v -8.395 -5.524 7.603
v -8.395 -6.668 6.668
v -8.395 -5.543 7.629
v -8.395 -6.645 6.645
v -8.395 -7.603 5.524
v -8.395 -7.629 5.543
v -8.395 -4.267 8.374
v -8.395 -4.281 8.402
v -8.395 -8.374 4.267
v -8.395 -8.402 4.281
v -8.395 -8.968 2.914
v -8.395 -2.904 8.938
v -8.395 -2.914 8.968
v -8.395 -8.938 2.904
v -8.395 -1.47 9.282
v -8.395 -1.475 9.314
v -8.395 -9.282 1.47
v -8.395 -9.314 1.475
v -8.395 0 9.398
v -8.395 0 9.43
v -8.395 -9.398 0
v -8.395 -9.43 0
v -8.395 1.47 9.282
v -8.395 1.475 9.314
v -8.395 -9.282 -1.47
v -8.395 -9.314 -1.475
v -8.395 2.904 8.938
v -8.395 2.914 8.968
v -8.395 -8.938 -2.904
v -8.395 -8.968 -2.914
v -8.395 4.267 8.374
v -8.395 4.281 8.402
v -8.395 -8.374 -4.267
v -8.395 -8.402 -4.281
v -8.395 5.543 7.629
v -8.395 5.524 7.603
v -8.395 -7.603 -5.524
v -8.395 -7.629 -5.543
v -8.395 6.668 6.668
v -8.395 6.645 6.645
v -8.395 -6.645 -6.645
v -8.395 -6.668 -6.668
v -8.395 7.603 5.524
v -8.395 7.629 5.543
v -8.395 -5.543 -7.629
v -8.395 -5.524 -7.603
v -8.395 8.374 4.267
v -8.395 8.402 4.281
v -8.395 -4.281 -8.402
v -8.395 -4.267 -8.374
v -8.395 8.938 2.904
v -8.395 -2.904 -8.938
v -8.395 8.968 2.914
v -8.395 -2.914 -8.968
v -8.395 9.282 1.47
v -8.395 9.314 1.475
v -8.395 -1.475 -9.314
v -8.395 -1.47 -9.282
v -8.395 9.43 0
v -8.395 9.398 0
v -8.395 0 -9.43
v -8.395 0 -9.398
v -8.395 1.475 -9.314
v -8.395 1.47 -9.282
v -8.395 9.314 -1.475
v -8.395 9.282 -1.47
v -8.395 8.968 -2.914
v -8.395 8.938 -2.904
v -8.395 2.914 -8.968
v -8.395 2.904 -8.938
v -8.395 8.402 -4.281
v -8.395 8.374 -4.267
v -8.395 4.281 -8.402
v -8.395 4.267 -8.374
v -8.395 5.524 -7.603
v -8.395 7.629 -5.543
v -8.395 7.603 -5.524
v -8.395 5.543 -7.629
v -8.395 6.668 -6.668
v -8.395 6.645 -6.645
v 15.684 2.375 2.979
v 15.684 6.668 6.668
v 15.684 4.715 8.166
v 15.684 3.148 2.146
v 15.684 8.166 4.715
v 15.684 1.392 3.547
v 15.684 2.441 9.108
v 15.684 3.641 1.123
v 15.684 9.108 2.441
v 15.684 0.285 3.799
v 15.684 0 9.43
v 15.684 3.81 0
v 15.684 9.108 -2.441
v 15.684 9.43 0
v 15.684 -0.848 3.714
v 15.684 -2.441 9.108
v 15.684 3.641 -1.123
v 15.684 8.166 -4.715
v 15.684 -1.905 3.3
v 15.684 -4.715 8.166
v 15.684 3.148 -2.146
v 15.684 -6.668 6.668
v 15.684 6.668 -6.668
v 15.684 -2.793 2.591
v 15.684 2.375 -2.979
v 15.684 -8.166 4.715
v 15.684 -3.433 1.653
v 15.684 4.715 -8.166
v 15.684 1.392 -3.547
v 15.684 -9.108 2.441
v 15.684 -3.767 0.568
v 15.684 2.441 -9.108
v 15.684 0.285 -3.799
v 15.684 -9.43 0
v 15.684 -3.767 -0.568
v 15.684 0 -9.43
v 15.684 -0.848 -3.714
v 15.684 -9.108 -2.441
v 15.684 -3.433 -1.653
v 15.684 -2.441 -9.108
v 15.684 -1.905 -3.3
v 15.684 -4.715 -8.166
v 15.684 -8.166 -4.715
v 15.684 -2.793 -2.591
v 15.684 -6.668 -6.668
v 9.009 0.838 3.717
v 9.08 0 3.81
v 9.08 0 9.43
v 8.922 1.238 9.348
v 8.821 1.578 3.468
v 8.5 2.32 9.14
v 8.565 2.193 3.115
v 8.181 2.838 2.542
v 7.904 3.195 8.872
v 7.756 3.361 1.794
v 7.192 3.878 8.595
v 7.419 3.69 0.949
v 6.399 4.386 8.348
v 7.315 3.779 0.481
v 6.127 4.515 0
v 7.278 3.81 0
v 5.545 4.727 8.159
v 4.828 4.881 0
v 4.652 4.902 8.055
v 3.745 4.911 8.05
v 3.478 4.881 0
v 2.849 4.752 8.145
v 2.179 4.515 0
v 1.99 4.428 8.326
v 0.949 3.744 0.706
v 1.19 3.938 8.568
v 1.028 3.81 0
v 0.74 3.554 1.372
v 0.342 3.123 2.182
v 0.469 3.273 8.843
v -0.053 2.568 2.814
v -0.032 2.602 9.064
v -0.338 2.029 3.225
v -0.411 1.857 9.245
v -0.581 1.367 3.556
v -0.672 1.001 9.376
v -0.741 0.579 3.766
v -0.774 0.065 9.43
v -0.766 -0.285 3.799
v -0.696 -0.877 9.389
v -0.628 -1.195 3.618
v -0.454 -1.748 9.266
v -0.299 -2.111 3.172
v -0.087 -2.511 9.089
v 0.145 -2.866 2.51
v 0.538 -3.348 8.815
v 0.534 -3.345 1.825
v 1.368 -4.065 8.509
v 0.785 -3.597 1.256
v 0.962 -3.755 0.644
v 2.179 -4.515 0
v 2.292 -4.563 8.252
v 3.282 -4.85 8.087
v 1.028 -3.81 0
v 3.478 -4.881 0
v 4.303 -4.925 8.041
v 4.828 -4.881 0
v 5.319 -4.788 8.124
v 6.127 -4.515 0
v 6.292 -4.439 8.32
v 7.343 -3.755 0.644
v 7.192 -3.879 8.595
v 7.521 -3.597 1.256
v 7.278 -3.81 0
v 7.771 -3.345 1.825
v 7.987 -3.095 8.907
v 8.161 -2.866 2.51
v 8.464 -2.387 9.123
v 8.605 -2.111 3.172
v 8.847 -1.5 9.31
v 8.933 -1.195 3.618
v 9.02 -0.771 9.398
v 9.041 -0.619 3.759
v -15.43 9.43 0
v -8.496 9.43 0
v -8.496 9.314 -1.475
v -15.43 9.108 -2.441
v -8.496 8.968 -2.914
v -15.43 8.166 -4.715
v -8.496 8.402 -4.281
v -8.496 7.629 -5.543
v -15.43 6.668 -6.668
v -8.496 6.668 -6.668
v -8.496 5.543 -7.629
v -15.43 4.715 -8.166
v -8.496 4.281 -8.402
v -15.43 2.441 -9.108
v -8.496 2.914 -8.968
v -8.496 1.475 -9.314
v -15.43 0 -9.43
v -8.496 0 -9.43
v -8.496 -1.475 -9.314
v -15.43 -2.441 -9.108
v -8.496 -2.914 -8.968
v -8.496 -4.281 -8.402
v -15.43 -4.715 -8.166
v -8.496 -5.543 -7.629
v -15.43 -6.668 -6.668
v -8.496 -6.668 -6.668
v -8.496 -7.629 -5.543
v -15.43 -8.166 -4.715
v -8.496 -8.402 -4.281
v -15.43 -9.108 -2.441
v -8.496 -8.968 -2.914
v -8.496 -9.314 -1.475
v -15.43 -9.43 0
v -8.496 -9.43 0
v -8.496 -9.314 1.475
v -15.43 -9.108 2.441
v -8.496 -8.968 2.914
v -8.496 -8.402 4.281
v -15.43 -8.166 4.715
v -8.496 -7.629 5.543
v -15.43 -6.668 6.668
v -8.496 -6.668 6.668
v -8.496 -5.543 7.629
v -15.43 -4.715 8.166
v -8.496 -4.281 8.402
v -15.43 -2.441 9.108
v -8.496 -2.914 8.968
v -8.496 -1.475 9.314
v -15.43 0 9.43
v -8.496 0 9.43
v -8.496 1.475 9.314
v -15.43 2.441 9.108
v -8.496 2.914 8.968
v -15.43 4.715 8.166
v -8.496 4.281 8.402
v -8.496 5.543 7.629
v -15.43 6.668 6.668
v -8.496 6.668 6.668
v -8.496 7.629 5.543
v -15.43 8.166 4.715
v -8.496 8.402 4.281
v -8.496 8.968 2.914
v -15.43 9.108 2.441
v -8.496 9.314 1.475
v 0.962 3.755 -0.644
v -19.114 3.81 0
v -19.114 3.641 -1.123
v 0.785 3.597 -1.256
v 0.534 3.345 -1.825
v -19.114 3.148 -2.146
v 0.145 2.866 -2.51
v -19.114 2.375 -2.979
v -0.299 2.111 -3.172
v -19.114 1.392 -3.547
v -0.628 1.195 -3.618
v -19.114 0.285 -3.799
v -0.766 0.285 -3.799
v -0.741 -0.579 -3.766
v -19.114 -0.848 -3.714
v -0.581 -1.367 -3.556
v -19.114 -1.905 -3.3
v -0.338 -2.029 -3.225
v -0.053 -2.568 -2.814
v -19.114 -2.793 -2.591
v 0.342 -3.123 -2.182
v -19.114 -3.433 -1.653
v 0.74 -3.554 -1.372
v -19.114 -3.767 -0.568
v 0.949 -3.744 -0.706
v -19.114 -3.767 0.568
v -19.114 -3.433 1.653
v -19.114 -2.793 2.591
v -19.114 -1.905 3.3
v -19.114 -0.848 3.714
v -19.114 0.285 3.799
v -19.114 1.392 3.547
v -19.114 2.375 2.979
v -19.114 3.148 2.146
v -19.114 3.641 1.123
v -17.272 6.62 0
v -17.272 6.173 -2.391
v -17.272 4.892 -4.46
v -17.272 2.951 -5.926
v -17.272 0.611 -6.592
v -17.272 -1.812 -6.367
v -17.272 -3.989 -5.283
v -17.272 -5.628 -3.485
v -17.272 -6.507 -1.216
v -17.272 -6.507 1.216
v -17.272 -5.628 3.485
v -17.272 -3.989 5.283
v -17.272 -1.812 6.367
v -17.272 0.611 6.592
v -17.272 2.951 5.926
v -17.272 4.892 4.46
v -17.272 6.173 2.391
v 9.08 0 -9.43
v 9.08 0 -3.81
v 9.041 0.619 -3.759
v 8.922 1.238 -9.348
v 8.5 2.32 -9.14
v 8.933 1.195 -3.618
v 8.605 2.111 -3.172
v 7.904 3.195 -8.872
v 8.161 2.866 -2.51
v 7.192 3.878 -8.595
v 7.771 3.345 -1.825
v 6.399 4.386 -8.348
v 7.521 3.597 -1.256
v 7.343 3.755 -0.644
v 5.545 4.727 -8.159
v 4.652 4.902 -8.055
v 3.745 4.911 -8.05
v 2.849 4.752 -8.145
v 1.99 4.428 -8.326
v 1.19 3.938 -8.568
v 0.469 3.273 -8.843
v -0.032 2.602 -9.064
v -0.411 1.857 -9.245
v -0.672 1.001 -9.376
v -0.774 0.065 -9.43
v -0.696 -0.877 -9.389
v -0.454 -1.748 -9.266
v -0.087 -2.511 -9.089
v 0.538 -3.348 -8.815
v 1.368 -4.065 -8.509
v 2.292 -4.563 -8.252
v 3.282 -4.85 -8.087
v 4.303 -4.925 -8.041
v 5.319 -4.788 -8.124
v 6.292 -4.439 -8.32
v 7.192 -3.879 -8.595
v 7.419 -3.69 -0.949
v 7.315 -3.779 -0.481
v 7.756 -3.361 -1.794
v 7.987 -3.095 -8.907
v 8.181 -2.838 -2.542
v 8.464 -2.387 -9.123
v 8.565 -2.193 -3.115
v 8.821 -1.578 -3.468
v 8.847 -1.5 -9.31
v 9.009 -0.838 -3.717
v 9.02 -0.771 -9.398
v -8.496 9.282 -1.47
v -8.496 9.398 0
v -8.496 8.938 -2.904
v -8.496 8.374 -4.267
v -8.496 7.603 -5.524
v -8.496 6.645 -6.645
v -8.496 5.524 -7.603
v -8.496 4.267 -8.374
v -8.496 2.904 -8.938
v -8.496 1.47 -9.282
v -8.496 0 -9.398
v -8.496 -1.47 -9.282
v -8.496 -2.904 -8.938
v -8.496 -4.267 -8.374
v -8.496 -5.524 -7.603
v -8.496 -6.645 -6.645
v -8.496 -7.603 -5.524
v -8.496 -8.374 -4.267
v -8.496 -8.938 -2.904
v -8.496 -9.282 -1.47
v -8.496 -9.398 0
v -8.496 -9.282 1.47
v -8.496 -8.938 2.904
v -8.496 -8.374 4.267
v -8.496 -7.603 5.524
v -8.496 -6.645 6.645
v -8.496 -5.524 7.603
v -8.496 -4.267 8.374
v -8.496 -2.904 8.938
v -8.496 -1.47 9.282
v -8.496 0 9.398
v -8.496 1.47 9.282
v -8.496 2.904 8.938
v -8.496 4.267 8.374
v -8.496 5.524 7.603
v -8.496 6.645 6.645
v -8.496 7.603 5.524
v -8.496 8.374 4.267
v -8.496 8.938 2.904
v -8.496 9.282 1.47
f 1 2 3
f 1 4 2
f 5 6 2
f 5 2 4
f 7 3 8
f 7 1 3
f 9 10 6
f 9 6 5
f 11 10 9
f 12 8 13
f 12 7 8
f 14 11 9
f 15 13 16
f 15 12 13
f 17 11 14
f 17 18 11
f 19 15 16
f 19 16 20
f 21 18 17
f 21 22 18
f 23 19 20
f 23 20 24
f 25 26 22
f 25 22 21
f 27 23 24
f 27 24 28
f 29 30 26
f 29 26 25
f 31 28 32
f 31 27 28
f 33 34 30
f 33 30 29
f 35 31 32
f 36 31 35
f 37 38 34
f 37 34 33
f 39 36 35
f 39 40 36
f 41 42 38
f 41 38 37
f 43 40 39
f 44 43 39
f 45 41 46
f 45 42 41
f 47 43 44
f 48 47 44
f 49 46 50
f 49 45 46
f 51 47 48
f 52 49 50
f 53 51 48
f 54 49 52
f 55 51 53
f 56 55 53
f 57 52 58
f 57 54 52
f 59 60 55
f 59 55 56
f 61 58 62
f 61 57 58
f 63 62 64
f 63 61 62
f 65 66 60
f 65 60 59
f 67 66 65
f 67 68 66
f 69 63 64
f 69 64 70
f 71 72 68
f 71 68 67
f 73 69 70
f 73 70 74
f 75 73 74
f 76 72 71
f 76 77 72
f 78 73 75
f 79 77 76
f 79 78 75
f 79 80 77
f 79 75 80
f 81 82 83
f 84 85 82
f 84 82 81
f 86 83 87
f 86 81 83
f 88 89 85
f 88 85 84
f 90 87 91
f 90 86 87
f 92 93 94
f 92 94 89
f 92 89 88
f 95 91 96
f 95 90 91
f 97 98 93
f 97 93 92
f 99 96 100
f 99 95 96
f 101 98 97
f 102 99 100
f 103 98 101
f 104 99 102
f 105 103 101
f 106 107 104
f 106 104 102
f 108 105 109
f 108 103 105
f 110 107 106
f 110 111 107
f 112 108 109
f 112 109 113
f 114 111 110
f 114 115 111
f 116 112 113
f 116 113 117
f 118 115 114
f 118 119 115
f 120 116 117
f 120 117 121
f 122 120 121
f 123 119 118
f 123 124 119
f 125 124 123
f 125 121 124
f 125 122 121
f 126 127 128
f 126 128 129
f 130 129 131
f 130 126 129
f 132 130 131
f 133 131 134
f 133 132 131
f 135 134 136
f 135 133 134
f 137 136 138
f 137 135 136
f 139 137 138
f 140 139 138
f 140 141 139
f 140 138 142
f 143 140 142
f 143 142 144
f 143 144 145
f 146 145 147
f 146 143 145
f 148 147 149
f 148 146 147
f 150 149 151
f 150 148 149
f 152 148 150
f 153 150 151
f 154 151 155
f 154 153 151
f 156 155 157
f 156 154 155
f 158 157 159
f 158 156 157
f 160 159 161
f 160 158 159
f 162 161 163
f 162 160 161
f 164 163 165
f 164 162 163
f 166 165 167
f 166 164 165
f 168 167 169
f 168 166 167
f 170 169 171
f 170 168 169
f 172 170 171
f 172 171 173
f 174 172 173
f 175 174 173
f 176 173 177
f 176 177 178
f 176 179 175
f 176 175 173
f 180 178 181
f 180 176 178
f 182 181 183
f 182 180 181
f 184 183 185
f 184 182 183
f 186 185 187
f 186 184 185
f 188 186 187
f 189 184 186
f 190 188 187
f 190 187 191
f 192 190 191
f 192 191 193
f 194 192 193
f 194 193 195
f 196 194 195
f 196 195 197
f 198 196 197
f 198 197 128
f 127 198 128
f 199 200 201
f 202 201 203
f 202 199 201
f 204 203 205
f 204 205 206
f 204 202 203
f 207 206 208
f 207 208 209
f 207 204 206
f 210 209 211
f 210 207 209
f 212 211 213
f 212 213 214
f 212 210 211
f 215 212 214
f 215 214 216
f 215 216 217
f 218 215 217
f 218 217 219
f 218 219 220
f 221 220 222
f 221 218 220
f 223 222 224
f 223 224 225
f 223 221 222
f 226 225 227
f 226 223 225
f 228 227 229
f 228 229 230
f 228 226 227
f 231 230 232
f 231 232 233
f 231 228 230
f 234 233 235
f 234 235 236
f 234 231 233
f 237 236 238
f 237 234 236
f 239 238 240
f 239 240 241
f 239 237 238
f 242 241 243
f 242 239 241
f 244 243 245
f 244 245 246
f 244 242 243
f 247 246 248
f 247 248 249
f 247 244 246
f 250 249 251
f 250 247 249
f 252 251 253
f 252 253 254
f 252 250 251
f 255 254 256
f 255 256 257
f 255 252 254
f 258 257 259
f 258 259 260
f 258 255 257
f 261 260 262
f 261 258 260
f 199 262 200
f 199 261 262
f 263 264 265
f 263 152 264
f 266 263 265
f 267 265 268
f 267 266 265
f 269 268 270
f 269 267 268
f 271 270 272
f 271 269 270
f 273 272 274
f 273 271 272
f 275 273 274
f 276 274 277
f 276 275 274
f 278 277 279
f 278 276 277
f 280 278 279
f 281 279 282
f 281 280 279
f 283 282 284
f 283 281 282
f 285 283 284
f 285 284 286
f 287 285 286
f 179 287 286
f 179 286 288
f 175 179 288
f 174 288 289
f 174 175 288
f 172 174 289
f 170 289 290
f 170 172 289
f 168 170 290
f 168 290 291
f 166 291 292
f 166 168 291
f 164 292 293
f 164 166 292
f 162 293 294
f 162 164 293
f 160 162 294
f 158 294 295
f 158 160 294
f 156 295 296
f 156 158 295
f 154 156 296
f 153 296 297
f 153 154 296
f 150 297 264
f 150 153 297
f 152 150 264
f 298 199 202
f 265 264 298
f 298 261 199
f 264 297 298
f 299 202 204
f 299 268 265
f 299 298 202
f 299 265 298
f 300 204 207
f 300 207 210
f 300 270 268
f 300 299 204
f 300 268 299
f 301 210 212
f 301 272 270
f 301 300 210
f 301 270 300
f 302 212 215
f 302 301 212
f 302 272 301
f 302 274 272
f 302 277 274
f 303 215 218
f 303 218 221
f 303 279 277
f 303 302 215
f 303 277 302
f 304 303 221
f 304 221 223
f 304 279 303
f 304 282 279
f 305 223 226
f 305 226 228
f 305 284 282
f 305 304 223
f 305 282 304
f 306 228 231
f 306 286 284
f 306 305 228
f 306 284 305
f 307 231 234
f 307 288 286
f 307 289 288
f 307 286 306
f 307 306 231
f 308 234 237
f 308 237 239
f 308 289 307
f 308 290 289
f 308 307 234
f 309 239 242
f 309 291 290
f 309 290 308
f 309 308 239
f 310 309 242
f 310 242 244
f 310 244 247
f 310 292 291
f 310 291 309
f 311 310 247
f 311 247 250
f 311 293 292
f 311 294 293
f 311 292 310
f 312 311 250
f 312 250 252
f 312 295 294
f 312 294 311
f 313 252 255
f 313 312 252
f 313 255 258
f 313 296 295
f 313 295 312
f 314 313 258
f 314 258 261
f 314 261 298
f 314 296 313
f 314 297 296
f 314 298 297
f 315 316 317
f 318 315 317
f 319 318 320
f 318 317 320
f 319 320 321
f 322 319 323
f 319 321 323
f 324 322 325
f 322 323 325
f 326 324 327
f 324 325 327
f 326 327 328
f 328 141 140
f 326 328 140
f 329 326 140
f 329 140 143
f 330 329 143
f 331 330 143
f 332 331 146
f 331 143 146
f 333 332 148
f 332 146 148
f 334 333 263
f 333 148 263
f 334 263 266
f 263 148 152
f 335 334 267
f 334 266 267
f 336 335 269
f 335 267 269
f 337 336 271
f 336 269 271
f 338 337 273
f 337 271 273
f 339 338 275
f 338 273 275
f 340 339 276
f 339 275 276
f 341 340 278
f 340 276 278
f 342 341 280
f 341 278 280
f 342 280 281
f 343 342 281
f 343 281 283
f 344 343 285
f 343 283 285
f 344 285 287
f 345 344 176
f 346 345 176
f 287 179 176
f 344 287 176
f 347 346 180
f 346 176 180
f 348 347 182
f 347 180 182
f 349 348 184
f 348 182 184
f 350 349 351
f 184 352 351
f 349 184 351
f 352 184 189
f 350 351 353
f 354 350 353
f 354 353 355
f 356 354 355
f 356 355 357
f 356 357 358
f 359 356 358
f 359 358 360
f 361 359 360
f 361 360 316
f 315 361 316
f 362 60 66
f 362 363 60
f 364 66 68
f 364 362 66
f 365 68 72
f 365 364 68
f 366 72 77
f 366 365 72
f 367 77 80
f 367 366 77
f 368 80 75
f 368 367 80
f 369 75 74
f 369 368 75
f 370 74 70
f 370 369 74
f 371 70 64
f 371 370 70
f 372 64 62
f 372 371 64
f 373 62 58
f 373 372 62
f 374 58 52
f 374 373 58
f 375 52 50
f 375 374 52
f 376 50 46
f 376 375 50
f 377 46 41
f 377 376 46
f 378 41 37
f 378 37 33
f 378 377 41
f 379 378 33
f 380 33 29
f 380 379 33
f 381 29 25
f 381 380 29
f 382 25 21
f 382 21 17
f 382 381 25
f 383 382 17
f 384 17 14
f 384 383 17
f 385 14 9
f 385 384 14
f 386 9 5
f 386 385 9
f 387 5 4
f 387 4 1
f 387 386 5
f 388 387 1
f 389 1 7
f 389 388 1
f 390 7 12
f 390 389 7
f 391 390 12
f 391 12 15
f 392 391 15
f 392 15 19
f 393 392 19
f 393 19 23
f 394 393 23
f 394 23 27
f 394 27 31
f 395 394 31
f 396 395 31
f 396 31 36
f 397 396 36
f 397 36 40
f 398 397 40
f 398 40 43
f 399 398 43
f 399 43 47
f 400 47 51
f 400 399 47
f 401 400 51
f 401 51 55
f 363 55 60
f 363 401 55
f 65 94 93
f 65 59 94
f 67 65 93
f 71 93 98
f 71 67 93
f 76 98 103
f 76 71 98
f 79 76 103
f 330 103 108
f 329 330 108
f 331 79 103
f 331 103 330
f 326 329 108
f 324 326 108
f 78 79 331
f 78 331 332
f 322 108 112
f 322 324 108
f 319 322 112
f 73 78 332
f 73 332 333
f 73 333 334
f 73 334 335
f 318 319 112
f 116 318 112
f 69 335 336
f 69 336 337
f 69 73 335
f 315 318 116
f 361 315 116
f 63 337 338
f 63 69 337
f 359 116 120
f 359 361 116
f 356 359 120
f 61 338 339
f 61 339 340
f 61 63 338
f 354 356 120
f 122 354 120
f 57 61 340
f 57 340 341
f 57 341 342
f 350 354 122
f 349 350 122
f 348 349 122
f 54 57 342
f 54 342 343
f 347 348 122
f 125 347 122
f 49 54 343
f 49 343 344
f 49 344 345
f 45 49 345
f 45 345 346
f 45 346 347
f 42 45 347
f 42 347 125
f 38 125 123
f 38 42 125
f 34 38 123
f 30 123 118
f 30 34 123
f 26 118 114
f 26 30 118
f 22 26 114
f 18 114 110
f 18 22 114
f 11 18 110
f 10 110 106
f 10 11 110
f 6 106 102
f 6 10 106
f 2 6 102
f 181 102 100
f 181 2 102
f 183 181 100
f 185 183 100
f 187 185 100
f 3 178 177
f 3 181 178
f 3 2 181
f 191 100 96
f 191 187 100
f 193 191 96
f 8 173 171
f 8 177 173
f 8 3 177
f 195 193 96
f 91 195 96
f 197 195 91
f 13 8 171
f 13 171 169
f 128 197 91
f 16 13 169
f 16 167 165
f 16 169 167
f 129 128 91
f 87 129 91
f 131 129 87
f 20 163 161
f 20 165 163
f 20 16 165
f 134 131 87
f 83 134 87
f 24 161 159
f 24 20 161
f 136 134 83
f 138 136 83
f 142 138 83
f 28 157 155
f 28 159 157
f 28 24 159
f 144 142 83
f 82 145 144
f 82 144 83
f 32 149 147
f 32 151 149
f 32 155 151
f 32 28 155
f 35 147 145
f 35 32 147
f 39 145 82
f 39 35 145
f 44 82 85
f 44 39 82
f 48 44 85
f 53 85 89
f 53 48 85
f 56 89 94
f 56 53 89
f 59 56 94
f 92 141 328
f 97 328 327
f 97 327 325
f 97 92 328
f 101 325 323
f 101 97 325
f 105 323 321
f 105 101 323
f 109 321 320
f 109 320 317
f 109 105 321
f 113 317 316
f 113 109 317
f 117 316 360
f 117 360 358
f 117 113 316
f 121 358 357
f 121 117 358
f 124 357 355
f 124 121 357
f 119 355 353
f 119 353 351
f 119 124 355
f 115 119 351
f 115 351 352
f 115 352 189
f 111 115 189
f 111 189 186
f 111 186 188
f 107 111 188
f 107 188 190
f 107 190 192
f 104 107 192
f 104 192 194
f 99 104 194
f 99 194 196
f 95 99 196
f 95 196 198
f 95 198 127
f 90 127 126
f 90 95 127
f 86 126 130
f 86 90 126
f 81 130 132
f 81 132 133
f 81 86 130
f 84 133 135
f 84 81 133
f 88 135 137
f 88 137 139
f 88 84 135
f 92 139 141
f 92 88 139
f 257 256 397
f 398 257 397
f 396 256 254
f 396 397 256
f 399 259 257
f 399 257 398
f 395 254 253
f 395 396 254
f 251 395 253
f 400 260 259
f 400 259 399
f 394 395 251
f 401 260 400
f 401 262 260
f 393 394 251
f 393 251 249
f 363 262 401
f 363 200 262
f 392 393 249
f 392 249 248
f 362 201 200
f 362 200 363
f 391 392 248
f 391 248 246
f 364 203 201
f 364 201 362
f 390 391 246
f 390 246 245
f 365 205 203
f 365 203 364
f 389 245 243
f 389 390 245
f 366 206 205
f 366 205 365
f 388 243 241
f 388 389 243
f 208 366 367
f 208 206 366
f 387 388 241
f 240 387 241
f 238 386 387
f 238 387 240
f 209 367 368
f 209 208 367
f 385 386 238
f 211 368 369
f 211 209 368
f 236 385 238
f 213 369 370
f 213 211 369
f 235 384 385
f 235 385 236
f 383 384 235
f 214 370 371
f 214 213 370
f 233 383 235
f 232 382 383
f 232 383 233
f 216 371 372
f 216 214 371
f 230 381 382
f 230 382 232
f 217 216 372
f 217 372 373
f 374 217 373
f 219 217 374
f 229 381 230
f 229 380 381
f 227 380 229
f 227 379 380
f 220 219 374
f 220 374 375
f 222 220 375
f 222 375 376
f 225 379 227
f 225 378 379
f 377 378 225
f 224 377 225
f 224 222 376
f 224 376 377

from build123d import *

# Parameters (mm, degrees)
SKETCH2_R               = 4.9276
CUT_EXTRUDE1_DEPTH      = 10.42975
CUT_EXTRUDE1_DEPTH_BACK = 10.42975


with BuildPart() as part:
    # Sketch1 → Revolve1 (revolve)
    with BuildSketch(Plane.XY):
        Polygon((-1.7145, 3.81), (15.6845, 3.81), (15.6845, 9.42975), (-8.3947, 9.42975), (-8.3947, 9.398), (-8.4455, 9.398), (-8.4963, 9.398), (-8.4963, 9.42975), (-15.4305, 9.42975), (-19.1135, 3.81), align=None)
    revolve(axis=Axis((0, 0, 0), (-1, 0, 0)))

    # Sketch2 → Cut-Extrude1 (cut, two sides)
    with BuildSketch(Plane.XY) as cut_extrude1_sk:
        with Locations((4.1529, 0)):
            Circle(SKETCH2_R)
    extrude(amount=CUT_EXTRUDE1_DEPTH, mode=Mode.SUBTRACT)
    extrude(cut_extrude1_sk.sketch, amount=-CUT_EXTRUDE1_DEPTH_BACK, mode=Mode.SUBTRACT)


solid = part.part
